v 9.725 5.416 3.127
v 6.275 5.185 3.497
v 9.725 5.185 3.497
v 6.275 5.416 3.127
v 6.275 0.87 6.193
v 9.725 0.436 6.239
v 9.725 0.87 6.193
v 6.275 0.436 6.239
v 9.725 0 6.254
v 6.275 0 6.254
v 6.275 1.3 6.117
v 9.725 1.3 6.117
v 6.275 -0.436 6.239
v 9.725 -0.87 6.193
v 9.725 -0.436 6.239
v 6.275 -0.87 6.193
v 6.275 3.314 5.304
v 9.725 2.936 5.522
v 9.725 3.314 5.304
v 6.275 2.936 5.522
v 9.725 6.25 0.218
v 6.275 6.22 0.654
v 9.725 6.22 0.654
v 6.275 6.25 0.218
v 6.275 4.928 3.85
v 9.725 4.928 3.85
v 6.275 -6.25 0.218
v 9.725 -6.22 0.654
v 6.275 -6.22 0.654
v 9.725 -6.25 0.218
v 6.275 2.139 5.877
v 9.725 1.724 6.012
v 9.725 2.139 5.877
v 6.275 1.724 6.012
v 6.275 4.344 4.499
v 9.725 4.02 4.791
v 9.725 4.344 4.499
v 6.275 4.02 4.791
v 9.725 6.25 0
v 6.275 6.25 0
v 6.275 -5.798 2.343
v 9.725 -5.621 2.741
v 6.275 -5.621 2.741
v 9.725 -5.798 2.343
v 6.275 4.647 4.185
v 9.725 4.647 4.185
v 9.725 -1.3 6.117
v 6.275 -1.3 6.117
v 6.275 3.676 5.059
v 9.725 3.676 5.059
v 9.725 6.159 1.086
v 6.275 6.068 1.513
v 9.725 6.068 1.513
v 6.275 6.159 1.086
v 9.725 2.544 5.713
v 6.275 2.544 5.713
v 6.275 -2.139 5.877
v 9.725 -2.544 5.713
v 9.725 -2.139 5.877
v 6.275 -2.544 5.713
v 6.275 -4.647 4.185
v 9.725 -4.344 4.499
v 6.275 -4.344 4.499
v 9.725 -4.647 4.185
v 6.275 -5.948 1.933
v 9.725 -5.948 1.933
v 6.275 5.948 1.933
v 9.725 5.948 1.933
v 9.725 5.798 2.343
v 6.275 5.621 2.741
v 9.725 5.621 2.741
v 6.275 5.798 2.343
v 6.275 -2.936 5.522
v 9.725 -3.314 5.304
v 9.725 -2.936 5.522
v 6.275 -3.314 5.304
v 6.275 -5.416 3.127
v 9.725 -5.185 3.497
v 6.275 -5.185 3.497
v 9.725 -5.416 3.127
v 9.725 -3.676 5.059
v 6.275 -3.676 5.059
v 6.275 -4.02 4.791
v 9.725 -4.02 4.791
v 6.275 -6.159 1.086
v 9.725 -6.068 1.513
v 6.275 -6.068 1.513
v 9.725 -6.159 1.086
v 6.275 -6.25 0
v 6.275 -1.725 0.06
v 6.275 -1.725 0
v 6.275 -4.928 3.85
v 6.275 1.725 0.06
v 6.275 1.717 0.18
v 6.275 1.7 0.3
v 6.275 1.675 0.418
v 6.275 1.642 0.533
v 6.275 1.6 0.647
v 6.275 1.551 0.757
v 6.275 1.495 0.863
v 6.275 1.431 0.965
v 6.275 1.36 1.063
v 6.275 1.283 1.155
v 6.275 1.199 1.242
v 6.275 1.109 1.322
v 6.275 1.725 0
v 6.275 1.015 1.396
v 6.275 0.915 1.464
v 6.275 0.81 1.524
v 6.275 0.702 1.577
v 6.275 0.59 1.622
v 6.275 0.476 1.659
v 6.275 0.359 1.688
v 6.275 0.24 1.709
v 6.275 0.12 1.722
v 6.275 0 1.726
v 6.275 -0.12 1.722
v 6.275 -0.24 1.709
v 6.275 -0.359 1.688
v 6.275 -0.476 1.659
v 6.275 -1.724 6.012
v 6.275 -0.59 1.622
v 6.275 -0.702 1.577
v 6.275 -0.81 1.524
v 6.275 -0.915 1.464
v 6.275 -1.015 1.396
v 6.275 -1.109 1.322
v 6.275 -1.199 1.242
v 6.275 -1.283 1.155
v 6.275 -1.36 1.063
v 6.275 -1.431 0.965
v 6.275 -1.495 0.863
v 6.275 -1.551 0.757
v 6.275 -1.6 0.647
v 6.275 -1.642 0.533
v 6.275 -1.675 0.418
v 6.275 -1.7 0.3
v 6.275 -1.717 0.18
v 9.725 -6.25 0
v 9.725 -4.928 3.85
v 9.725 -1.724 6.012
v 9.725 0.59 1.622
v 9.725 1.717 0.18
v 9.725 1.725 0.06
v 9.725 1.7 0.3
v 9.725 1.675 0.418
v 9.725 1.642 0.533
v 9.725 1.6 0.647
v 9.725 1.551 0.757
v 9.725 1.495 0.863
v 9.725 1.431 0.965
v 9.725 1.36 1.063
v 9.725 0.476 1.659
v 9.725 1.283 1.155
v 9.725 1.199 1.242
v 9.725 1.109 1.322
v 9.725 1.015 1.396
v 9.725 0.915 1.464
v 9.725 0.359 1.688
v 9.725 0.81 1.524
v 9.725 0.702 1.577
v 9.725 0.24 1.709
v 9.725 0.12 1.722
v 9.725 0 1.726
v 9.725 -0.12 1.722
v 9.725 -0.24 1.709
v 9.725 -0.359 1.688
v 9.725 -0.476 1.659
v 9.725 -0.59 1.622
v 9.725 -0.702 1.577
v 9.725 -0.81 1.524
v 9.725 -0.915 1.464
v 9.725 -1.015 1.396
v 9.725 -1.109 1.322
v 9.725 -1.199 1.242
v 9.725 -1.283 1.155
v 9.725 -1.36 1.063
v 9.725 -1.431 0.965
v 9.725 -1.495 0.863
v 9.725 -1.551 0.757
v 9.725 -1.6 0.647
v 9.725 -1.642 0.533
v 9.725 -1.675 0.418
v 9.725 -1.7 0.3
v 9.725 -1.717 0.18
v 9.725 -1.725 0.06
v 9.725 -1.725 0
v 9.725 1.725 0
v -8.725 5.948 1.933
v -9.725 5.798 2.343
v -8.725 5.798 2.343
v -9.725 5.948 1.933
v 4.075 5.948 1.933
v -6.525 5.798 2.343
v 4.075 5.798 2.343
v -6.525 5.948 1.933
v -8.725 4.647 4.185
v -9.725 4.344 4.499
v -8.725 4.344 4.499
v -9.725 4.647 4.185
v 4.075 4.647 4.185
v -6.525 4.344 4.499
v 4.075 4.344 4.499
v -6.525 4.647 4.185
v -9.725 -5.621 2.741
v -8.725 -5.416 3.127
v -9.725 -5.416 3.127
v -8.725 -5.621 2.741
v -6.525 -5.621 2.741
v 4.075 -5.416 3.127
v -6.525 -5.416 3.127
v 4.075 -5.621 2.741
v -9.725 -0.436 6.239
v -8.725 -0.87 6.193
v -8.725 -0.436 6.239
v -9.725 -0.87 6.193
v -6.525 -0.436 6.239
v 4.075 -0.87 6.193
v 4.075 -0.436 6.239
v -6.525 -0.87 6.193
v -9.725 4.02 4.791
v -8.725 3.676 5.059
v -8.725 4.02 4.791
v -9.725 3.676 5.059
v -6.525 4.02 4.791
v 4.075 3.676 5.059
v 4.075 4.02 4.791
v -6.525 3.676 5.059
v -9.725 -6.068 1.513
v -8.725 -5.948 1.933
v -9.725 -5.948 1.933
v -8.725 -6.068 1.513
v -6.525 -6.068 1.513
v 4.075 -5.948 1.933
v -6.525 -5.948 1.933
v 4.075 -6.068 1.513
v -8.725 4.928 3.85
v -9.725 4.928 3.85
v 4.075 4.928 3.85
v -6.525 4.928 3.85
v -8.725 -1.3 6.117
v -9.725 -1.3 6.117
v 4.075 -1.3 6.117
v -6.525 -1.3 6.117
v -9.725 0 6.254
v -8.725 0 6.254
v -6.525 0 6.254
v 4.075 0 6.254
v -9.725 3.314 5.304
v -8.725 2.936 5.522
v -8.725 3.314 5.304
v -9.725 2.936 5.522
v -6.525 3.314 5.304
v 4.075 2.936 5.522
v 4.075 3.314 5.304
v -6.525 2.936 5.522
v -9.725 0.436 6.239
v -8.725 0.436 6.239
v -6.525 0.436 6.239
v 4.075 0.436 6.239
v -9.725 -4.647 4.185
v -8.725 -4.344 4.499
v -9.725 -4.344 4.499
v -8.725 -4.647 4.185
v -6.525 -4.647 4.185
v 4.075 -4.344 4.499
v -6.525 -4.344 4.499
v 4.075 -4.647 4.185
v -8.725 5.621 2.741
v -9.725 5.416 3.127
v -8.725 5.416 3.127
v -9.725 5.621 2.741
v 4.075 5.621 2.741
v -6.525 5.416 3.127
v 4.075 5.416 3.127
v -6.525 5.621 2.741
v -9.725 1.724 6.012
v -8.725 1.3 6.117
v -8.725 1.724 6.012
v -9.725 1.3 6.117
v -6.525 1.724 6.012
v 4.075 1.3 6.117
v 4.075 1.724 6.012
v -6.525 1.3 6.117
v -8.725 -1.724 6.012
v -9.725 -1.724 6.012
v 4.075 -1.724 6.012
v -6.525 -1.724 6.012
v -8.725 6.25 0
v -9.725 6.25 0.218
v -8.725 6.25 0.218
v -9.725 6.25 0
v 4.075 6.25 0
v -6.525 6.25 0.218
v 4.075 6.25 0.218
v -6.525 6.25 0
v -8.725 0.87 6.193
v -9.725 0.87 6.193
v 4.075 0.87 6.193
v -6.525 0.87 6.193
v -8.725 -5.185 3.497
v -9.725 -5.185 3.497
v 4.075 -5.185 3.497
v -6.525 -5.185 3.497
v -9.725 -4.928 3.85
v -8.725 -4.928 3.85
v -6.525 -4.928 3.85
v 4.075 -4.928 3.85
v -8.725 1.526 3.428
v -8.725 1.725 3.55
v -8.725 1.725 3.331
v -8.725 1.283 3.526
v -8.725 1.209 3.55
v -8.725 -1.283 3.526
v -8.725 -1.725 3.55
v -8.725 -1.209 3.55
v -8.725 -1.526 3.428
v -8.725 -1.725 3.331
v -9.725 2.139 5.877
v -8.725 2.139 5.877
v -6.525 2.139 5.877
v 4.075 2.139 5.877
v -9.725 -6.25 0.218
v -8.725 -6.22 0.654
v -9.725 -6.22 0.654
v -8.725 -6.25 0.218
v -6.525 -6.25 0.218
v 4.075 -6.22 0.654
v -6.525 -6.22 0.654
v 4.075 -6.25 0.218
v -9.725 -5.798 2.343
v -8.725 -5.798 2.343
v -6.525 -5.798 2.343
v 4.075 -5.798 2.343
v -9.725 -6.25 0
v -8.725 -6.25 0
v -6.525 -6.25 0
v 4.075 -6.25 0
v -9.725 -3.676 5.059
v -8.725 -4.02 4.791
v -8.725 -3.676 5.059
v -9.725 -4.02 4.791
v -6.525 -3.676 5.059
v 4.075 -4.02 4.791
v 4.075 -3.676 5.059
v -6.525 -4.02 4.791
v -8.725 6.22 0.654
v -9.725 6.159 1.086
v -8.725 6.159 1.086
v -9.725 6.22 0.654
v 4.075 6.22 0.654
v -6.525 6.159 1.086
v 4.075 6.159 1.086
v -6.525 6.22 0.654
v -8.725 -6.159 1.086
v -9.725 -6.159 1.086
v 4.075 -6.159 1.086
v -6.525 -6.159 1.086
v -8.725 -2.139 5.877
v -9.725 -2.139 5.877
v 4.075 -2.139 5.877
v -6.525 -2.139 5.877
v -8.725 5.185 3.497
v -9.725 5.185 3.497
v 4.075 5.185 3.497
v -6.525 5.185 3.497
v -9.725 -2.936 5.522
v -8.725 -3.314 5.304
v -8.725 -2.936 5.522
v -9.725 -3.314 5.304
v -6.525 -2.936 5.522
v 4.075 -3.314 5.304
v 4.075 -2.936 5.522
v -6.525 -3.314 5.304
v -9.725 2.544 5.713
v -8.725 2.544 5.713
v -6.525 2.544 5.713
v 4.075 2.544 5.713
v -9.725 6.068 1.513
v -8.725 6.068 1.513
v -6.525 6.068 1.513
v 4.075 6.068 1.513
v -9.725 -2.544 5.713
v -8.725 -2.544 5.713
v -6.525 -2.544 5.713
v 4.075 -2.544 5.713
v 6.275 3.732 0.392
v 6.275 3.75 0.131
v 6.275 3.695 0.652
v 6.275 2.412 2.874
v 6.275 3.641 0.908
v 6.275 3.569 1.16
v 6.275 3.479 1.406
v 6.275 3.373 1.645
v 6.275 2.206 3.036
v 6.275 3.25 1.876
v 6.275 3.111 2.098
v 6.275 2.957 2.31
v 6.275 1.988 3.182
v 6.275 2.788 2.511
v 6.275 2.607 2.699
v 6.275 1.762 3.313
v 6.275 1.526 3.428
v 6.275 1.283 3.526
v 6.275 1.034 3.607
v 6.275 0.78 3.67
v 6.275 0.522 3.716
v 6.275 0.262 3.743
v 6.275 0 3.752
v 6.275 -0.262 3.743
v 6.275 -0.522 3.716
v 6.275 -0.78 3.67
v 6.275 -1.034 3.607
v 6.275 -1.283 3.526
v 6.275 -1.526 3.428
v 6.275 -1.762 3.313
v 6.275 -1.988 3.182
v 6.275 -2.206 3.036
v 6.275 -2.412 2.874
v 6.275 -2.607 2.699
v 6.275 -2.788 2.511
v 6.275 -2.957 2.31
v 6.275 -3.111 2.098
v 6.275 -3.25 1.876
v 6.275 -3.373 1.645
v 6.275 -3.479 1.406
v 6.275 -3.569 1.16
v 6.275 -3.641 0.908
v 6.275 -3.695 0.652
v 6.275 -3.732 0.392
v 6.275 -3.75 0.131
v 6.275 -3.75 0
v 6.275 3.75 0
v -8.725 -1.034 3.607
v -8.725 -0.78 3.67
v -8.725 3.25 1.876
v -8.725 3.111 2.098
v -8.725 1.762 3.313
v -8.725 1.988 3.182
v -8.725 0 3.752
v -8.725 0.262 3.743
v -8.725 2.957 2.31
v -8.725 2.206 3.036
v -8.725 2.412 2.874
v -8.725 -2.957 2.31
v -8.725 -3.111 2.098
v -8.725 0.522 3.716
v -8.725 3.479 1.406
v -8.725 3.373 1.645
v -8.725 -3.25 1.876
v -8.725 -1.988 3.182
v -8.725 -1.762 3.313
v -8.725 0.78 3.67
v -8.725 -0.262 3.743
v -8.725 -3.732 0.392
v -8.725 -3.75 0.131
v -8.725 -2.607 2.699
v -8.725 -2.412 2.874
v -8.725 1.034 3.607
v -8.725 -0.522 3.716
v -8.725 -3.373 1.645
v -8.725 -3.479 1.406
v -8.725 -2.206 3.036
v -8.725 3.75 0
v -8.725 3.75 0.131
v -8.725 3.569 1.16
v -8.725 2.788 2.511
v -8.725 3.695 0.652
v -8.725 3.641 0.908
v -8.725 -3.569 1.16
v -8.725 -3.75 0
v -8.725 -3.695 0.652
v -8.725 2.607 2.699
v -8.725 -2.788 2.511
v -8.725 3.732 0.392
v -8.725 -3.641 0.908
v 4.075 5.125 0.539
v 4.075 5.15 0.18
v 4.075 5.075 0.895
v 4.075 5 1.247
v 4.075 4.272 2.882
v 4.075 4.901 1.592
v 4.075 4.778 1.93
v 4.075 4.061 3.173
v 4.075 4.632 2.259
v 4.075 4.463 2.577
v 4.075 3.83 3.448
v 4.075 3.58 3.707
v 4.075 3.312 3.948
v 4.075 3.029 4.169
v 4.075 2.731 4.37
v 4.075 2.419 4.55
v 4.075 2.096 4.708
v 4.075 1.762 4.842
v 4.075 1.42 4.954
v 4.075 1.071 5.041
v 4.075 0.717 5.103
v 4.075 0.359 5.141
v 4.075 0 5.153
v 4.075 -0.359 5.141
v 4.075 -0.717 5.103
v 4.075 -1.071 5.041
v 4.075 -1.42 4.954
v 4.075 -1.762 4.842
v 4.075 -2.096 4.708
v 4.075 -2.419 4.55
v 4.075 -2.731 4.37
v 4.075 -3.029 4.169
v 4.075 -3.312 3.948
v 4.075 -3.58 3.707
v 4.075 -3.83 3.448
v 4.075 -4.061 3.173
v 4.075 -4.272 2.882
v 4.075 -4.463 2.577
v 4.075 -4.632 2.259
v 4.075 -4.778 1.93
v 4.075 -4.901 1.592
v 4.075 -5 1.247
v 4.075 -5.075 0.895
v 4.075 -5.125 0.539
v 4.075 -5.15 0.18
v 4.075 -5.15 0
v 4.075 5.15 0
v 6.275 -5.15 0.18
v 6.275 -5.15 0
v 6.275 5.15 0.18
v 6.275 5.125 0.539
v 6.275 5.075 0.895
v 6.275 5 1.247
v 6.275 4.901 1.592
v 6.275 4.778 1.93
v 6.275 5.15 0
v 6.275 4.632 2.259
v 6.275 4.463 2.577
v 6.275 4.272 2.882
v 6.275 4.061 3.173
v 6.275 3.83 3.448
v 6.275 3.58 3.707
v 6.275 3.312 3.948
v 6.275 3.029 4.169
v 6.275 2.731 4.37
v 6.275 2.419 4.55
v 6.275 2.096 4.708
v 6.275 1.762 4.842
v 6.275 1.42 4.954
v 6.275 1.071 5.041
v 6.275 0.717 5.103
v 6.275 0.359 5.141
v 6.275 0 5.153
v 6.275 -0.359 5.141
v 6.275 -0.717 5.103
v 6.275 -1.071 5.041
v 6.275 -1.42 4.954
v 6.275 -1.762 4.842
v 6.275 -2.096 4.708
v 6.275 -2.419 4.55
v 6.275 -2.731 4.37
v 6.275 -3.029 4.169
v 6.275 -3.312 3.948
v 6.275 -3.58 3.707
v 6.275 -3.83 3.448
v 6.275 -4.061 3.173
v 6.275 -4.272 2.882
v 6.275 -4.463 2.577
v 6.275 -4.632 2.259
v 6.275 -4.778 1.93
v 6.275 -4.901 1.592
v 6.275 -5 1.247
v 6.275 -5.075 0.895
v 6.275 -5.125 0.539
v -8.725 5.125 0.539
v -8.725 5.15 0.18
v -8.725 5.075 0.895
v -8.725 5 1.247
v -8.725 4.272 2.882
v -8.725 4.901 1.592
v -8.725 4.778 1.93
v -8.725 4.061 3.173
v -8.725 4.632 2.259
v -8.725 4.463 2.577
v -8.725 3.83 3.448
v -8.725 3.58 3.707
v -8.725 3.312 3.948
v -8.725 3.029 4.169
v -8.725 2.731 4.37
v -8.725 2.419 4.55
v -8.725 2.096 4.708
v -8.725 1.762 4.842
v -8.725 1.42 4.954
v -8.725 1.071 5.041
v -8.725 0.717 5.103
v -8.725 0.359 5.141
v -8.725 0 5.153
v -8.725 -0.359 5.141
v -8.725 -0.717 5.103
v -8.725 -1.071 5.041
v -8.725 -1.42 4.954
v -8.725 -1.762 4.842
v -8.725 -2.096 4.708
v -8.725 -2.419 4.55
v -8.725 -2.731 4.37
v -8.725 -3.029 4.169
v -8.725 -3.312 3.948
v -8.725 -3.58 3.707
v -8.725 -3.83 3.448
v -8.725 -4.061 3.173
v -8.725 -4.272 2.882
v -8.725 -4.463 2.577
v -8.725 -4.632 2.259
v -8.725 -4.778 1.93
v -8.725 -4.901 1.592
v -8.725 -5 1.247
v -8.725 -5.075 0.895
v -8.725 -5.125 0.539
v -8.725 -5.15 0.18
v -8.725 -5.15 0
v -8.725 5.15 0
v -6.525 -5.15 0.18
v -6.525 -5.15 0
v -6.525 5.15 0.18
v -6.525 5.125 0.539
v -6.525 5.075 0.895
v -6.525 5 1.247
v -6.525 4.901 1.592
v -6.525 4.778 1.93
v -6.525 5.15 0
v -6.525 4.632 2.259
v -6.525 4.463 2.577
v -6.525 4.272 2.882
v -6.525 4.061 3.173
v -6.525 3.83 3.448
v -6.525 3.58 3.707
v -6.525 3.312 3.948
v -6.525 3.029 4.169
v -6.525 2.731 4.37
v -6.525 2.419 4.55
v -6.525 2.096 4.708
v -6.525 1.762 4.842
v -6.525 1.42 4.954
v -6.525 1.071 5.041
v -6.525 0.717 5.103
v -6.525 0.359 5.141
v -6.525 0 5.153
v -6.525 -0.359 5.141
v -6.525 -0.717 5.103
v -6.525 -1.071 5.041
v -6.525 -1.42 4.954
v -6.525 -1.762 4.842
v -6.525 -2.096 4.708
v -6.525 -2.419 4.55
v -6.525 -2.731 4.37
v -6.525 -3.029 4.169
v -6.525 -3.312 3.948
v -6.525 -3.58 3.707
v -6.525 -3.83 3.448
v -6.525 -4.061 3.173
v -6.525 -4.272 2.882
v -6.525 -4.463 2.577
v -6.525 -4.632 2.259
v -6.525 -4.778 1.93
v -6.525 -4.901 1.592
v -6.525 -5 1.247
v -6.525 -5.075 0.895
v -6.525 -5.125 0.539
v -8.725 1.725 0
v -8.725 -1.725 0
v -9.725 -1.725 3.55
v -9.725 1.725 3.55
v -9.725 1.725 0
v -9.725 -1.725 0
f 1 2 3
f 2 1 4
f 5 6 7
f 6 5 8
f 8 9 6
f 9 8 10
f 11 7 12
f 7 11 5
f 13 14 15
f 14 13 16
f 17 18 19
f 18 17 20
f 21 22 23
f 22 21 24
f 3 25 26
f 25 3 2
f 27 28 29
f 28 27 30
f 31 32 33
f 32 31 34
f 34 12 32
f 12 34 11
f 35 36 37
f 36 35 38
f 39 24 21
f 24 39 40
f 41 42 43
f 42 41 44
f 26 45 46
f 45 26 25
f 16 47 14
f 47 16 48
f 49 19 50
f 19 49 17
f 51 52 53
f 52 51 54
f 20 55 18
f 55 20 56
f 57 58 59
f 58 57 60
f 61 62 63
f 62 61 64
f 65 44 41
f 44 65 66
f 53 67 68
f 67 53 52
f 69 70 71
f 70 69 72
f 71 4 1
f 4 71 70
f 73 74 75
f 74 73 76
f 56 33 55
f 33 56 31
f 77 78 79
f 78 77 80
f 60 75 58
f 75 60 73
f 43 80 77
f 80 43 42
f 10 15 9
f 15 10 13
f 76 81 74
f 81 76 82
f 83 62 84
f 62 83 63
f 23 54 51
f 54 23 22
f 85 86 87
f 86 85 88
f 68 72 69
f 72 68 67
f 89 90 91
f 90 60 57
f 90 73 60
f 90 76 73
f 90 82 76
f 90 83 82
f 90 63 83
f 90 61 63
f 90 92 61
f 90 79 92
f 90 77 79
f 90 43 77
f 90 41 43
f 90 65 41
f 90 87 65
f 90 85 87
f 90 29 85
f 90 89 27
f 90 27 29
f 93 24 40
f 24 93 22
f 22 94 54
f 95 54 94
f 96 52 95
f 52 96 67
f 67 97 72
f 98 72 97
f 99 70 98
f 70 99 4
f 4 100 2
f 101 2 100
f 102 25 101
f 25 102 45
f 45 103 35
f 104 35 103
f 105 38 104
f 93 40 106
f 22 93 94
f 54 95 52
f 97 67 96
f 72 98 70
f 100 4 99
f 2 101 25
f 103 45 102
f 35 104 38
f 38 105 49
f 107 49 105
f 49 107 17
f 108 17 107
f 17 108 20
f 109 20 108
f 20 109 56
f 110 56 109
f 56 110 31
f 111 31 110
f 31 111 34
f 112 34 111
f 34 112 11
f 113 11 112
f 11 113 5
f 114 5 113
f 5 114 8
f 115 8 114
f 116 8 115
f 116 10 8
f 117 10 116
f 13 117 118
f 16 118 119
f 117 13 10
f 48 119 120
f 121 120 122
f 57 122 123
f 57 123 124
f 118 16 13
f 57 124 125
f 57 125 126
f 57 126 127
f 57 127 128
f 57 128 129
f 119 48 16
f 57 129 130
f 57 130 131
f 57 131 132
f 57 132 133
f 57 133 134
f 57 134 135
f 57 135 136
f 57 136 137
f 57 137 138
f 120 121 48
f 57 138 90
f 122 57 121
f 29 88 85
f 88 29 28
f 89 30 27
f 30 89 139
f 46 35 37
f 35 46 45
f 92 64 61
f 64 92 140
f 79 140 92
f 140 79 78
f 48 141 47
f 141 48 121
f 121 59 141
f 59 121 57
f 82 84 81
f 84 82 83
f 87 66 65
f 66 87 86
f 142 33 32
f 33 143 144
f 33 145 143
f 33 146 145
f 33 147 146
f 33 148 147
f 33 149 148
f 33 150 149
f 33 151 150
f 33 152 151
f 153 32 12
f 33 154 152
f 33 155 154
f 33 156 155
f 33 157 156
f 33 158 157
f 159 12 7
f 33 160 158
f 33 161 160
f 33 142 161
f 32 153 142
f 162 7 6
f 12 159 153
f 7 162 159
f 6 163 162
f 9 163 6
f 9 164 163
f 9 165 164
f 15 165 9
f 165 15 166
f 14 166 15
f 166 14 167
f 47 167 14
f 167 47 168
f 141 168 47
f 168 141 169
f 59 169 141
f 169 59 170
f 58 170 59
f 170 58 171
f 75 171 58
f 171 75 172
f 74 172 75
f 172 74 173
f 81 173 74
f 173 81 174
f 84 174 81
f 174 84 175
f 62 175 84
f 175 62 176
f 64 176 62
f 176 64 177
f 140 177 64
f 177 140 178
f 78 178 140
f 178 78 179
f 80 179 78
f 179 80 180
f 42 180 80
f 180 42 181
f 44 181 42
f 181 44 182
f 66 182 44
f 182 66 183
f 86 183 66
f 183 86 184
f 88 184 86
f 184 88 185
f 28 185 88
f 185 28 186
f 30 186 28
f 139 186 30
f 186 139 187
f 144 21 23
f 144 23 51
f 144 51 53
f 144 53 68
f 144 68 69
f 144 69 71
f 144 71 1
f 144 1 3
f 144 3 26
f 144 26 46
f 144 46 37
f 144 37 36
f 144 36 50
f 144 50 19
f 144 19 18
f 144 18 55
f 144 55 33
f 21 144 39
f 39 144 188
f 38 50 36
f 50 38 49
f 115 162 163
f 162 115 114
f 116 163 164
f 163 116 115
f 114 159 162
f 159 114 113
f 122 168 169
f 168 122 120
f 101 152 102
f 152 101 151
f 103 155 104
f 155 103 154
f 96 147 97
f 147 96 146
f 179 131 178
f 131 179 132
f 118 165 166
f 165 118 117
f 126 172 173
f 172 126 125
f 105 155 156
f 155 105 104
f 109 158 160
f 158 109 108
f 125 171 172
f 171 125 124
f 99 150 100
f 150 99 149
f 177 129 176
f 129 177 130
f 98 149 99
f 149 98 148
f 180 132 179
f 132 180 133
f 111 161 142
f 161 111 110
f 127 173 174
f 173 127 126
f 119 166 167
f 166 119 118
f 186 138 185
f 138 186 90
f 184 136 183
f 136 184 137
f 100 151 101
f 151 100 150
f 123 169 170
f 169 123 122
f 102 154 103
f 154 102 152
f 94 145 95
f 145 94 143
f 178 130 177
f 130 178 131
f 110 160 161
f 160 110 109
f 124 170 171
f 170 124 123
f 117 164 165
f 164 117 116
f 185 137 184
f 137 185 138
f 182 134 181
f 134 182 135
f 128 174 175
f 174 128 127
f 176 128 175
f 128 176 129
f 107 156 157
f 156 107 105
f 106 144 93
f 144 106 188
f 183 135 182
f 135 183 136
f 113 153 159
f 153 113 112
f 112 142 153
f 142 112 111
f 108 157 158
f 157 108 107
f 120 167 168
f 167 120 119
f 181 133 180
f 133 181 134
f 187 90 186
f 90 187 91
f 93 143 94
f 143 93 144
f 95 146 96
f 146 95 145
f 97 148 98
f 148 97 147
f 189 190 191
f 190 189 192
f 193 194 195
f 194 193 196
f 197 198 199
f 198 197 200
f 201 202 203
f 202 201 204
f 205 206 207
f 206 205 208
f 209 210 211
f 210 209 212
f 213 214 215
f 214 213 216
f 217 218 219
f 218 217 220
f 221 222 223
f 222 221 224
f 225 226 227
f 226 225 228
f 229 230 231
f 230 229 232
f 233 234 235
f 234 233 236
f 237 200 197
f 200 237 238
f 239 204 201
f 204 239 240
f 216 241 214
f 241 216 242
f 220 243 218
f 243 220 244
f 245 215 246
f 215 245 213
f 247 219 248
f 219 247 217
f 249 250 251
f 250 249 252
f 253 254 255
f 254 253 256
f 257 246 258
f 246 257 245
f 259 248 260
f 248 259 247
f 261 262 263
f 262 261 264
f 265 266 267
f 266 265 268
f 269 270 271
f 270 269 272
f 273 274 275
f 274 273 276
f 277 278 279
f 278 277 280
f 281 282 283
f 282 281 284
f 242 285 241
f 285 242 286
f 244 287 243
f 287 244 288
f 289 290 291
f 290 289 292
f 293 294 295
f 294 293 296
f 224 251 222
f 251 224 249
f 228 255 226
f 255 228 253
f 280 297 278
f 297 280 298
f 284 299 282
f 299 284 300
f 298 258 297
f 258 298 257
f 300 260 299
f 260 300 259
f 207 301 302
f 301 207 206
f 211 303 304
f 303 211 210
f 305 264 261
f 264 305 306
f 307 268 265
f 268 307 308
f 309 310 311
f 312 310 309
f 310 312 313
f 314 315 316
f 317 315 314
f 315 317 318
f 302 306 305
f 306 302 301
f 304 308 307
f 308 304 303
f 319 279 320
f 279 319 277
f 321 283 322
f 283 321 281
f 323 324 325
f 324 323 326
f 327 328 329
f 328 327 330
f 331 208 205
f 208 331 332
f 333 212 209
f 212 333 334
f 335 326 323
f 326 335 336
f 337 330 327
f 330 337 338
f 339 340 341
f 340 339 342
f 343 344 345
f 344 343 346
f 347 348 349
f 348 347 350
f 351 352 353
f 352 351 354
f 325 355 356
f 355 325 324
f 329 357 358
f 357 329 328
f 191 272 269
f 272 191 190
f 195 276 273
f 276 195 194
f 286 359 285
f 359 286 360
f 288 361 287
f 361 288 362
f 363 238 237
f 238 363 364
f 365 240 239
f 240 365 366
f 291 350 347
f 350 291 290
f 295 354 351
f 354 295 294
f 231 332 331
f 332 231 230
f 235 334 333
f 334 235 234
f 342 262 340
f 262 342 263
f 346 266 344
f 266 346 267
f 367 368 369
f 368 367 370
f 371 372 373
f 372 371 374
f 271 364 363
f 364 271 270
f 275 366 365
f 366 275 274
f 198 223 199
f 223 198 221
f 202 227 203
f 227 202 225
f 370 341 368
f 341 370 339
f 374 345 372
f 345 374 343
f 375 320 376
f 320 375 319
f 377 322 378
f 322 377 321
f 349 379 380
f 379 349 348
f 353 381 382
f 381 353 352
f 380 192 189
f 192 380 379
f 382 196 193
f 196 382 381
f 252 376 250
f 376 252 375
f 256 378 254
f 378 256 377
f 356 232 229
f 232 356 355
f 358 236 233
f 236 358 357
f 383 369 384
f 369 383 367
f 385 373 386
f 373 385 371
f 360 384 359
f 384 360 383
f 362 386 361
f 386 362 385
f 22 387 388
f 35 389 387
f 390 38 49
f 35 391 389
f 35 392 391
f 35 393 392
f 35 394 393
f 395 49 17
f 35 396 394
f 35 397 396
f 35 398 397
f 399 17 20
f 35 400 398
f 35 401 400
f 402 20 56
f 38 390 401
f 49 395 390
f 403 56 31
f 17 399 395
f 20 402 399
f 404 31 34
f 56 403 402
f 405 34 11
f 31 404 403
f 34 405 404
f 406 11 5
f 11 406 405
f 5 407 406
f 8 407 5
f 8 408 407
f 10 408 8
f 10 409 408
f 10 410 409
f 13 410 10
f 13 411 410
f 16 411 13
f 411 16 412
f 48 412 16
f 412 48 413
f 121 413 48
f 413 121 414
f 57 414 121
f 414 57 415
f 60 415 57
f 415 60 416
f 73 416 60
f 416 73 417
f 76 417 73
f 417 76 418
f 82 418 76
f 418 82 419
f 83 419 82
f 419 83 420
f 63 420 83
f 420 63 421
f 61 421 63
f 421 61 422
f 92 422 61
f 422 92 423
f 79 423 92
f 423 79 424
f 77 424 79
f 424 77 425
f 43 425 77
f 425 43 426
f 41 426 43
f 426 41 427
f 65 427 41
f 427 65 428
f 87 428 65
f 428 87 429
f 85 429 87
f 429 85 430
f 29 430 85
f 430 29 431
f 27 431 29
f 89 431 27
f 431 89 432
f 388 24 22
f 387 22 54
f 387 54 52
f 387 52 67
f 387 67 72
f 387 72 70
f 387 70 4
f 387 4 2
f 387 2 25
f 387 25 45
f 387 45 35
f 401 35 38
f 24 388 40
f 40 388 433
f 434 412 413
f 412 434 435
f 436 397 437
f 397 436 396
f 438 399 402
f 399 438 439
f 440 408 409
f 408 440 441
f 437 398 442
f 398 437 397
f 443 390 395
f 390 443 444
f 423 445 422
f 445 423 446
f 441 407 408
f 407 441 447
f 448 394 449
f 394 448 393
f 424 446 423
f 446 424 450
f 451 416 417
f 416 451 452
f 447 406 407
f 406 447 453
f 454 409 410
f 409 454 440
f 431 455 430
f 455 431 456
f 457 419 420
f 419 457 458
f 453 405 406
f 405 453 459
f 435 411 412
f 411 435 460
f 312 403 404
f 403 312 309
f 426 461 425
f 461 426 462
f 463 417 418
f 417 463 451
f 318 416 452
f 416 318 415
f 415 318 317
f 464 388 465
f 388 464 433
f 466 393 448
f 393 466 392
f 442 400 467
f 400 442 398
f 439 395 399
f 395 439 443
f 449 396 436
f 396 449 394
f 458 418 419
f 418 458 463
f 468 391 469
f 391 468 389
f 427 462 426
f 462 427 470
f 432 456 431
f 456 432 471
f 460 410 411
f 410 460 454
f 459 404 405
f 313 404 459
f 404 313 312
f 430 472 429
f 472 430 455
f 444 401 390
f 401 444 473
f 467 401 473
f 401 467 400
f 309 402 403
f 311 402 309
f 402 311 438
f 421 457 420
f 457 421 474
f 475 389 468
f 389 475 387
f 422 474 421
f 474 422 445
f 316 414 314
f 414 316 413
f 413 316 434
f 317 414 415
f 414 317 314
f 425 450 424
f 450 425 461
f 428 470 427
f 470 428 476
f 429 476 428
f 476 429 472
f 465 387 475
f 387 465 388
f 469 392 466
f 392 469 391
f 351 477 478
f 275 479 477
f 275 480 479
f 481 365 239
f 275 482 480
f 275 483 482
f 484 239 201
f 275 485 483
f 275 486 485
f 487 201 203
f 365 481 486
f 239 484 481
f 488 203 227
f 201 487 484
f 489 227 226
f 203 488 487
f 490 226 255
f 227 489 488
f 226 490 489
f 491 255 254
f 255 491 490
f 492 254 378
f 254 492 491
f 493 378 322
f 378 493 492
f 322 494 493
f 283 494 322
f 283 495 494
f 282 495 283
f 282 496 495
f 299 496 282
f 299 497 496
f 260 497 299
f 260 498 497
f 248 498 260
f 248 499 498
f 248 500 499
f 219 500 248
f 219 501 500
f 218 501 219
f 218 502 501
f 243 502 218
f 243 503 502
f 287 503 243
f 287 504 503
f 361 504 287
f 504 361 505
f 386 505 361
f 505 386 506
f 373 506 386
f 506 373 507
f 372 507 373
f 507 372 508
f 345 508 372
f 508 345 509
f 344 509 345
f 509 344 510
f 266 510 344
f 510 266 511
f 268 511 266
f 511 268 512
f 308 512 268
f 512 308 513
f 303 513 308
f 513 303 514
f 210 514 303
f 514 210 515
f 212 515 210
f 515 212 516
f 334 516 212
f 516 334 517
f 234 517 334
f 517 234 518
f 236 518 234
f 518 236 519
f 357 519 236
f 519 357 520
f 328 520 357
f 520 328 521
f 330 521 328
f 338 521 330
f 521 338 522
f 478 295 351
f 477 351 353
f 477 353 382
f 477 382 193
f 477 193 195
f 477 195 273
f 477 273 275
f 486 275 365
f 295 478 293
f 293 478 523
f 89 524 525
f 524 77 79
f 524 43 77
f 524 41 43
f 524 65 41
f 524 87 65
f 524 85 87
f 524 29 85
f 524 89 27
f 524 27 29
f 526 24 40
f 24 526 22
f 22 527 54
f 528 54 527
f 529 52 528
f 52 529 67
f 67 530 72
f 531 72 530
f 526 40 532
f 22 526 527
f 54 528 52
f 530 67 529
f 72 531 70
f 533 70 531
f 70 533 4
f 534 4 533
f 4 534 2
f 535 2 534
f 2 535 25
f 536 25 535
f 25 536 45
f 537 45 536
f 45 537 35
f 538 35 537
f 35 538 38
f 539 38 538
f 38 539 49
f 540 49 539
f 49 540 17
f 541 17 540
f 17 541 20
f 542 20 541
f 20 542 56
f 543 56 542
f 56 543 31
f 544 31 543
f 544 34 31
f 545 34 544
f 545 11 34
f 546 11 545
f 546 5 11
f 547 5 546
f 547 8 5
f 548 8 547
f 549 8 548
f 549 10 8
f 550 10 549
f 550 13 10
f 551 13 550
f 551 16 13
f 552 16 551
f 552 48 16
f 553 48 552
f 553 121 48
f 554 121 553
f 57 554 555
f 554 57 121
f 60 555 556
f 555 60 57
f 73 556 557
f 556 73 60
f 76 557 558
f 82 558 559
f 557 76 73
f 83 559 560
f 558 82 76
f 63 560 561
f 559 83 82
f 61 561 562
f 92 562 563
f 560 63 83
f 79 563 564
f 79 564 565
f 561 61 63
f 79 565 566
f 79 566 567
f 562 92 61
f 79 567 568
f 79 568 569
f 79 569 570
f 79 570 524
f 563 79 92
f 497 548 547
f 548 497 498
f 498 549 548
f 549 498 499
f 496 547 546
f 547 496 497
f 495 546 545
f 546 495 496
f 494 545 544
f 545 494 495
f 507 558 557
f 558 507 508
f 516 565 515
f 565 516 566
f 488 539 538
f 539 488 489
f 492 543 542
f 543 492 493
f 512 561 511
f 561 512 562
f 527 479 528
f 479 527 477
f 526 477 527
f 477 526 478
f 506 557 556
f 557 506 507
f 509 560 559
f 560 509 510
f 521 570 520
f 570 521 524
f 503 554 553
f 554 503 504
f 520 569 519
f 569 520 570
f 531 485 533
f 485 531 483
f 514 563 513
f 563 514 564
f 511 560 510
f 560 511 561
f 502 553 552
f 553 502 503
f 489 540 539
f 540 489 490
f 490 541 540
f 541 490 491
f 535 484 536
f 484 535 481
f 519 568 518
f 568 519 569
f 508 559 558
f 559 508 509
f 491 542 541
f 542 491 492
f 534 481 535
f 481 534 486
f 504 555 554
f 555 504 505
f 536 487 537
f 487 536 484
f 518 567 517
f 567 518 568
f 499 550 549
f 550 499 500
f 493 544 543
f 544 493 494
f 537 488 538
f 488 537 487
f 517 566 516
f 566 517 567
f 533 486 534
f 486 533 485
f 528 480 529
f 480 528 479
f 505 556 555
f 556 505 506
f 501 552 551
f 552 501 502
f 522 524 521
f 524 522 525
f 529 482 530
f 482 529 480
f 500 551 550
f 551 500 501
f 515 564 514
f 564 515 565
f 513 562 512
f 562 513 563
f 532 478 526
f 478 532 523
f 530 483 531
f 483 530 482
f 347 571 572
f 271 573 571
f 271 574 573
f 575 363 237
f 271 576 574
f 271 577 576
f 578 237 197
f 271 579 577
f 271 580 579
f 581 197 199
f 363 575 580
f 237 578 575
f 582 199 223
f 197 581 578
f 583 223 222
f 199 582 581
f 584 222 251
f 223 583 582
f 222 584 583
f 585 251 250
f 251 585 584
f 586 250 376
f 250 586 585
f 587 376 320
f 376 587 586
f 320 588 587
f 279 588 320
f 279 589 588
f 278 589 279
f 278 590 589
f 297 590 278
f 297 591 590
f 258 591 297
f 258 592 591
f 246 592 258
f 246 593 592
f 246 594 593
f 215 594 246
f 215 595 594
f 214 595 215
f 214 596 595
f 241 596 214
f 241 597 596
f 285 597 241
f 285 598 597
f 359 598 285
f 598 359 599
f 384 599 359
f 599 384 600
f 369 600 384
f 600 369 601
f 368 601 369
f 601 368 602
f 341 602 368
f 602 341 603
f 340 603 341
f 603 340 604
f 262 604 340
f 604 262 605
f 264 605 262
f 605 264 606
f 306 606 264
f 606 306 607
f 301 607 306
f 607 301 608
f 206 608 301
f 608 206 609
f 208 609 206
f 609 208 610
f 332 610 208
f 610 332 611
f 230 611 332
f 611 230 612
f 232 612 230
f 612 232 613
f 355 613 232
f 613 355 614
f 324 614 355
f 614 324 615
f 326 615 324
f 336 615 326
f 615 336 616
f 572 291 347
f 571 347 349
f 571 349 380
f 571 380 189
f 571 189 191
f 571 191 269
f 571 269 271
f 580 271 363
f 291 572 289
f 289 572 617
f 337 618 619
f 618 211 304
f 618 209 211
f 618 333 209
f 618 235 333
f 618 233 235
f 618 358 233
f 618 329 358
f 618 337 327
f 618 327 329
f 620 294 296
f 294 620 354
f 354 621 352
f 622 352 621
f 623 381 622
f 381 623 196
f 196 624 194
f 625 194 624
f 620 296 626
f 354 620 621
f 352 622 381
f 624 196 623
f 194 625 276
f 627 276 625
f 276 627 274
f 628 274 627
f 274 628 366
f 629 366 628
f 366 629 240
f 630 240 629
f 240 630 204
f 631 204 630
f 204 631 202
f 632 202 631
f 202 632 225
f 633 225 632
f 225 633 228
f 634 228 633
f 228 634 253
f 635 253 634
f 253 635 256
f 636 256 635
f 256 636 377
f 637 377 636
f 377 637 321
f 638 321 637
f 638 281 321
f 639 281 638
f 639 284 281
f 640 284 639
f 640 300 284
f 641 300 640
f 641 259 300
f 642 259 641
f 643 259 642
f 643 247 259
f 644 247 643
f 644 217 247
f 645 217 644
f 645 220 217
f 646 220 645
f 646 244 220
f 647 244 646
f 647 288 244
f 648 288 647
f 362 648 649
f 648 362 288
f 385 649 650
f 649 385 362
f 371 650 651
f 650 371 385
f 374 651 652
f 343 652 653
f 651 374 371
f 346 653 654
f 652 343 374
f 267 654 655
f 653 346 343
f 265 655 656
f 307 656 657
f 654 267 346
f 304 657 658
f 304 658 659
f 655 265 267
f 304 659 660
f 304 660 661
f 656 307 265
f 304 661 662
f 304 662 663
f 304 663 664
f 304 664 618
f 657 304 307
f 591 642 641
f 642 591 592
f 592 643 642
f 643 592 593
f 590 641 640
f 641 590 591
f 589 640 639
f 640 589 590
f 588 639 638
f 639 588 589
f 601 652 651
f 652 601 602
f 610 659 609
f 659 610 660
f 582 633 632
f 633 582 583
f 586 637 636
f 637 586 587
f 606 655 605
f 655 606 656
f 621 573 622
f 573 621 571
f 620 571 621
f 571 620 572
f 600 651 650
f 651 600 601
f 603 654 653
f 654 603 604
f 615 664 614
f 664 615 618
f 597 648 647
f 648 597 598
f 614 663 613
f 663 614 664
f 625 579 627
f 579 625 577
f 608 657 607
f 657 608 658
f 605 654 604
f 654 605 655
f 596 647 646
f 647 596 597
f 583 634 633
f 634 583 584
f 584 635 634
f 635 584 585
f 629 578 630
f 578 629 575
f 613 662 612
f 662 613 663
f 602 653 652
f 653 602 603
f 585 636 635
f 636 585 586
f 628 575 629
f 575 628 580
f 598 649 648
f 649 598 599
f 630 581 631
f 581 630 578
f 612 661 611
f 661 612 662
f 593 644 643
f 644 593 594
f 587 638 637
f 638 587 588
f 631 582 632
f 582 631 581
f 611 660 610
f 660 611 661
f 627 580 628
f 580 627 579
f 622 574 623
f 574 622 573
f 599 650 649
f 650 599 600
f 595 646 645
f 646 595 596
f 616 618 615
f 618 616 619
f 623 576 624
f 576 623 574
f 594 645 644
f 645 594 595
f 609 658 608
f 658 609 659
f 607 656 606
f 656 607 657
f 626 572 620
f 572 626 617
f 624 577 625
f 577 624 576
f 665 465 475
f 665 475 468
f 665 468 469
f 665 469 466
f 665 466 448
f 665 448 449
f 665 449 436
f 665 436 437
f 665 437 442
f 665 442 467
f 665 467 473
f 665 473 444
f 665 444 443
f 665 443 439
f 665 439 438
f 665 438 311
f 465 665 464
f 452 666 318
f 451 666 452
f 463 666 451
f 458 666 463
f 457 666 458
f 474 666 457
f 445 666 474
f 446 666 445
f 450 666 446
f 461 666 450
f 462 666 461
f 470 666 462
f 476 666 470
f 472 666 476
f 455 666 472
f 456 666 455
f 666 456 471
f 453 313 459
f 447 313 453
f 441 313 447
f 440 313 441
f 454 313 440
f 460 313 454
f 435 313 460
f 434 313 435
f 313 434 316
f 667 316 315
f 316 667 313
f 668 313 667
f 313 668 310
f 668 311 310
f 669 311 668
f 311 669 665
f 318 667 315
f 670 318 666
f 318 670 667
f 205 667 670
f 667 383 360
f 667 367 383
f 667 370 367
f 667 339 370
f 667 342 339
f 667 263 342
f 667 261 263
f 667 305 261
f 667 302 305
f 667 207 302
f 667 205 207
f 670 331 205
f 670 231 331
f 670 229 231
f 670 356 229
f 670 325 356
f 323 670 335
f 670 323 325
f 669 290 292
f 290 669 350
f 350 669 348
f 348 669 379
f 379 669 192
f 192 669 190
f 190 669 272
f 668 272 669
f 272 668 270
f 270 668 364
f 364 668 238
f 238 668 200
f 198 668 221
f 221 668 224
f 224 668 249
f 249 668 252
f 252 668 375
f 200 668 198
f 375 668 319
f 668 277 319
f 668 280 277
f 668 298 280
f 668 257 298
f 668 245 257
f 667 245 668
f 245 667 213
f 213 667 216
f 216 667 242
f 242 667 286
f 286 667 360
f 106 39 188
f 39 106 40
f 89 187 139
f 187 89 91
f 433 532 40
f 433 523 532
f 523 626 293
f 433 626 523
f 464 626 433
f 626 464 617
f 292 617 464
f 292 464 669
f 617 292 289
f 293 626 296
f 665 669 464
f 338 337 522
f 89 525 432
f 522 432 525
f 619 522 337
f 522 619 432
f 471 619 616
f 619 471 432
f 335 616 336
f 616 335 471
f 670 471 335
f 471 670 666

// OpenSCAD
// grahampheath

// Default 0.5. "is the minimum size of a fragment"
part_quality=.5; // [0.1:0.1:1]

splice_cavety_diameter=7.5;
splice_width_diameter=12.5;
splice_length=15;

ziptie_channel_width=2.2;
ziptie_channel_height=1.1;

in_wire_opening_length=3.45;
in_round_wire_opening=true;
in_round_wire_opening_diameter=3.45;
in_square_wire_opening=false;
in_square_wire_opening_width=7.1;
in_square_wire_opening_height=3.45;

out_wire_opening_length=1;
out_round_wire_opening=false;
out_round_wire_opening_diameter=3.45;
out_square_wire_opening=true;
out_square_wire_opening_width=7.1;
out_square_wire_opening_height=3.45;

zipties=2;
ziptie_spacing=12.75;

/* [Hidden] */
$fa=1;
$fs=part_quality;
in_round_wire_opening_radius=in_round_wire_opening_diameter/2;
out_round_wire_opening_radius=out_round_wire_opening_diameter/2;
splice_cavety_radius=splice_cavety_diameter/2;
splice_width_radius=splice_width_diameter/2;


module cylinder_outer(radius,height,center, fn=90) {
  fudge = 1/cos(180/fn);
  cylinder(r=radius*fudge,h=height,center=center,$fn=fn);
}


module splice_opening(
    height=2,
    outer_radius=10,
    round=true,
    round_radius=2,
    square=false,
    square_width=3,
    square_height=4) {

  difference() {
    translate([0, 0, height/2]) {
      cylinder_outer(radius=outer_radius, height=height, center=true);
    }

    e=0.2;
    if (round) {
      translate([0, 0, height/2]) {
        cylinder_outer(radius=round_radius, height=height, center=true);
      }
    }

    if (square) {
      translate([-square_width/2, -square_height/2, 0]) {
        cube(size=[square_width, square_height, height], center=false);
      }
    }
  }

}

module splice_jacket() {
  cylinder_outer(radius=splice_width_radius, height=splice_length, center=false);
}

module splice_cavety() {
  cylinder_outer(radius=splice_cavety_radius, height=splice_length, center=false);
}

module ziptie() {
  translate([0, 0, ziptie_channel_width/2]){
    difference() {
      cylinder_outer(radius=splice_width_radius, height=ziptie_channel_width, center=true);
      cylinder_outer(radius=splice_width_radius-ziptie_channel_height, height=ziptie_channel_width, center=true);
    }
  }
}

module splice_hull() {
  difference() {
    difference() {
      splice_jacket();
      splice_cavety();
    }

    translate([0, 0, 0]){
      ziptie();
    }

    translate([0, 0, splice_length-ziptie_channel_width]){
      ziptie();
    }
  }
}


module strain_relief() {
  union(){
    translate([0, 0, 0]) {
      splice_opening(
        height=in_wire_opening_length,
        outer_radius=splice_width_radius,
        round=in_round_wire_opening,
        round_radius=in_round_wire_opening_radius,
        square=in_square_wire_opening,
        square_width=in_square_wire_opening_width,
        square_height=in_square_wire_opening_height
      );
    }
    translate([0, 0, in_wire_opening_length]) {
      splice_hull();
    }
    translate([0, 0, splice_length + in_wire_opening_length]) {
      splice_opening(
        height=out_wire_opening_length,
        outer_radius=splice_width_radius,
        round=out_round_wire_opening,
        round_radius=out_round_wire_opening_diameter,
        square=out_square_wire_opening,
        square_width=out_square_wire_opening_width,
        square_height=out_square_wire_opening_height
      );

    }
  }
}

rotate([0, 270, 0]) {
  splice_length_sum=splice_length+in_wire_opening_length + out_wire_opening_length;
  translate([0, 0, -splice_length_sum/2]) {

    intersection() {
      translate ([0,-splice_width_diameter/2,0]) {
        cube([10,splice_width_diameter,splice_length_sum]);
      }
      strain_relief();
    }
  }
}
